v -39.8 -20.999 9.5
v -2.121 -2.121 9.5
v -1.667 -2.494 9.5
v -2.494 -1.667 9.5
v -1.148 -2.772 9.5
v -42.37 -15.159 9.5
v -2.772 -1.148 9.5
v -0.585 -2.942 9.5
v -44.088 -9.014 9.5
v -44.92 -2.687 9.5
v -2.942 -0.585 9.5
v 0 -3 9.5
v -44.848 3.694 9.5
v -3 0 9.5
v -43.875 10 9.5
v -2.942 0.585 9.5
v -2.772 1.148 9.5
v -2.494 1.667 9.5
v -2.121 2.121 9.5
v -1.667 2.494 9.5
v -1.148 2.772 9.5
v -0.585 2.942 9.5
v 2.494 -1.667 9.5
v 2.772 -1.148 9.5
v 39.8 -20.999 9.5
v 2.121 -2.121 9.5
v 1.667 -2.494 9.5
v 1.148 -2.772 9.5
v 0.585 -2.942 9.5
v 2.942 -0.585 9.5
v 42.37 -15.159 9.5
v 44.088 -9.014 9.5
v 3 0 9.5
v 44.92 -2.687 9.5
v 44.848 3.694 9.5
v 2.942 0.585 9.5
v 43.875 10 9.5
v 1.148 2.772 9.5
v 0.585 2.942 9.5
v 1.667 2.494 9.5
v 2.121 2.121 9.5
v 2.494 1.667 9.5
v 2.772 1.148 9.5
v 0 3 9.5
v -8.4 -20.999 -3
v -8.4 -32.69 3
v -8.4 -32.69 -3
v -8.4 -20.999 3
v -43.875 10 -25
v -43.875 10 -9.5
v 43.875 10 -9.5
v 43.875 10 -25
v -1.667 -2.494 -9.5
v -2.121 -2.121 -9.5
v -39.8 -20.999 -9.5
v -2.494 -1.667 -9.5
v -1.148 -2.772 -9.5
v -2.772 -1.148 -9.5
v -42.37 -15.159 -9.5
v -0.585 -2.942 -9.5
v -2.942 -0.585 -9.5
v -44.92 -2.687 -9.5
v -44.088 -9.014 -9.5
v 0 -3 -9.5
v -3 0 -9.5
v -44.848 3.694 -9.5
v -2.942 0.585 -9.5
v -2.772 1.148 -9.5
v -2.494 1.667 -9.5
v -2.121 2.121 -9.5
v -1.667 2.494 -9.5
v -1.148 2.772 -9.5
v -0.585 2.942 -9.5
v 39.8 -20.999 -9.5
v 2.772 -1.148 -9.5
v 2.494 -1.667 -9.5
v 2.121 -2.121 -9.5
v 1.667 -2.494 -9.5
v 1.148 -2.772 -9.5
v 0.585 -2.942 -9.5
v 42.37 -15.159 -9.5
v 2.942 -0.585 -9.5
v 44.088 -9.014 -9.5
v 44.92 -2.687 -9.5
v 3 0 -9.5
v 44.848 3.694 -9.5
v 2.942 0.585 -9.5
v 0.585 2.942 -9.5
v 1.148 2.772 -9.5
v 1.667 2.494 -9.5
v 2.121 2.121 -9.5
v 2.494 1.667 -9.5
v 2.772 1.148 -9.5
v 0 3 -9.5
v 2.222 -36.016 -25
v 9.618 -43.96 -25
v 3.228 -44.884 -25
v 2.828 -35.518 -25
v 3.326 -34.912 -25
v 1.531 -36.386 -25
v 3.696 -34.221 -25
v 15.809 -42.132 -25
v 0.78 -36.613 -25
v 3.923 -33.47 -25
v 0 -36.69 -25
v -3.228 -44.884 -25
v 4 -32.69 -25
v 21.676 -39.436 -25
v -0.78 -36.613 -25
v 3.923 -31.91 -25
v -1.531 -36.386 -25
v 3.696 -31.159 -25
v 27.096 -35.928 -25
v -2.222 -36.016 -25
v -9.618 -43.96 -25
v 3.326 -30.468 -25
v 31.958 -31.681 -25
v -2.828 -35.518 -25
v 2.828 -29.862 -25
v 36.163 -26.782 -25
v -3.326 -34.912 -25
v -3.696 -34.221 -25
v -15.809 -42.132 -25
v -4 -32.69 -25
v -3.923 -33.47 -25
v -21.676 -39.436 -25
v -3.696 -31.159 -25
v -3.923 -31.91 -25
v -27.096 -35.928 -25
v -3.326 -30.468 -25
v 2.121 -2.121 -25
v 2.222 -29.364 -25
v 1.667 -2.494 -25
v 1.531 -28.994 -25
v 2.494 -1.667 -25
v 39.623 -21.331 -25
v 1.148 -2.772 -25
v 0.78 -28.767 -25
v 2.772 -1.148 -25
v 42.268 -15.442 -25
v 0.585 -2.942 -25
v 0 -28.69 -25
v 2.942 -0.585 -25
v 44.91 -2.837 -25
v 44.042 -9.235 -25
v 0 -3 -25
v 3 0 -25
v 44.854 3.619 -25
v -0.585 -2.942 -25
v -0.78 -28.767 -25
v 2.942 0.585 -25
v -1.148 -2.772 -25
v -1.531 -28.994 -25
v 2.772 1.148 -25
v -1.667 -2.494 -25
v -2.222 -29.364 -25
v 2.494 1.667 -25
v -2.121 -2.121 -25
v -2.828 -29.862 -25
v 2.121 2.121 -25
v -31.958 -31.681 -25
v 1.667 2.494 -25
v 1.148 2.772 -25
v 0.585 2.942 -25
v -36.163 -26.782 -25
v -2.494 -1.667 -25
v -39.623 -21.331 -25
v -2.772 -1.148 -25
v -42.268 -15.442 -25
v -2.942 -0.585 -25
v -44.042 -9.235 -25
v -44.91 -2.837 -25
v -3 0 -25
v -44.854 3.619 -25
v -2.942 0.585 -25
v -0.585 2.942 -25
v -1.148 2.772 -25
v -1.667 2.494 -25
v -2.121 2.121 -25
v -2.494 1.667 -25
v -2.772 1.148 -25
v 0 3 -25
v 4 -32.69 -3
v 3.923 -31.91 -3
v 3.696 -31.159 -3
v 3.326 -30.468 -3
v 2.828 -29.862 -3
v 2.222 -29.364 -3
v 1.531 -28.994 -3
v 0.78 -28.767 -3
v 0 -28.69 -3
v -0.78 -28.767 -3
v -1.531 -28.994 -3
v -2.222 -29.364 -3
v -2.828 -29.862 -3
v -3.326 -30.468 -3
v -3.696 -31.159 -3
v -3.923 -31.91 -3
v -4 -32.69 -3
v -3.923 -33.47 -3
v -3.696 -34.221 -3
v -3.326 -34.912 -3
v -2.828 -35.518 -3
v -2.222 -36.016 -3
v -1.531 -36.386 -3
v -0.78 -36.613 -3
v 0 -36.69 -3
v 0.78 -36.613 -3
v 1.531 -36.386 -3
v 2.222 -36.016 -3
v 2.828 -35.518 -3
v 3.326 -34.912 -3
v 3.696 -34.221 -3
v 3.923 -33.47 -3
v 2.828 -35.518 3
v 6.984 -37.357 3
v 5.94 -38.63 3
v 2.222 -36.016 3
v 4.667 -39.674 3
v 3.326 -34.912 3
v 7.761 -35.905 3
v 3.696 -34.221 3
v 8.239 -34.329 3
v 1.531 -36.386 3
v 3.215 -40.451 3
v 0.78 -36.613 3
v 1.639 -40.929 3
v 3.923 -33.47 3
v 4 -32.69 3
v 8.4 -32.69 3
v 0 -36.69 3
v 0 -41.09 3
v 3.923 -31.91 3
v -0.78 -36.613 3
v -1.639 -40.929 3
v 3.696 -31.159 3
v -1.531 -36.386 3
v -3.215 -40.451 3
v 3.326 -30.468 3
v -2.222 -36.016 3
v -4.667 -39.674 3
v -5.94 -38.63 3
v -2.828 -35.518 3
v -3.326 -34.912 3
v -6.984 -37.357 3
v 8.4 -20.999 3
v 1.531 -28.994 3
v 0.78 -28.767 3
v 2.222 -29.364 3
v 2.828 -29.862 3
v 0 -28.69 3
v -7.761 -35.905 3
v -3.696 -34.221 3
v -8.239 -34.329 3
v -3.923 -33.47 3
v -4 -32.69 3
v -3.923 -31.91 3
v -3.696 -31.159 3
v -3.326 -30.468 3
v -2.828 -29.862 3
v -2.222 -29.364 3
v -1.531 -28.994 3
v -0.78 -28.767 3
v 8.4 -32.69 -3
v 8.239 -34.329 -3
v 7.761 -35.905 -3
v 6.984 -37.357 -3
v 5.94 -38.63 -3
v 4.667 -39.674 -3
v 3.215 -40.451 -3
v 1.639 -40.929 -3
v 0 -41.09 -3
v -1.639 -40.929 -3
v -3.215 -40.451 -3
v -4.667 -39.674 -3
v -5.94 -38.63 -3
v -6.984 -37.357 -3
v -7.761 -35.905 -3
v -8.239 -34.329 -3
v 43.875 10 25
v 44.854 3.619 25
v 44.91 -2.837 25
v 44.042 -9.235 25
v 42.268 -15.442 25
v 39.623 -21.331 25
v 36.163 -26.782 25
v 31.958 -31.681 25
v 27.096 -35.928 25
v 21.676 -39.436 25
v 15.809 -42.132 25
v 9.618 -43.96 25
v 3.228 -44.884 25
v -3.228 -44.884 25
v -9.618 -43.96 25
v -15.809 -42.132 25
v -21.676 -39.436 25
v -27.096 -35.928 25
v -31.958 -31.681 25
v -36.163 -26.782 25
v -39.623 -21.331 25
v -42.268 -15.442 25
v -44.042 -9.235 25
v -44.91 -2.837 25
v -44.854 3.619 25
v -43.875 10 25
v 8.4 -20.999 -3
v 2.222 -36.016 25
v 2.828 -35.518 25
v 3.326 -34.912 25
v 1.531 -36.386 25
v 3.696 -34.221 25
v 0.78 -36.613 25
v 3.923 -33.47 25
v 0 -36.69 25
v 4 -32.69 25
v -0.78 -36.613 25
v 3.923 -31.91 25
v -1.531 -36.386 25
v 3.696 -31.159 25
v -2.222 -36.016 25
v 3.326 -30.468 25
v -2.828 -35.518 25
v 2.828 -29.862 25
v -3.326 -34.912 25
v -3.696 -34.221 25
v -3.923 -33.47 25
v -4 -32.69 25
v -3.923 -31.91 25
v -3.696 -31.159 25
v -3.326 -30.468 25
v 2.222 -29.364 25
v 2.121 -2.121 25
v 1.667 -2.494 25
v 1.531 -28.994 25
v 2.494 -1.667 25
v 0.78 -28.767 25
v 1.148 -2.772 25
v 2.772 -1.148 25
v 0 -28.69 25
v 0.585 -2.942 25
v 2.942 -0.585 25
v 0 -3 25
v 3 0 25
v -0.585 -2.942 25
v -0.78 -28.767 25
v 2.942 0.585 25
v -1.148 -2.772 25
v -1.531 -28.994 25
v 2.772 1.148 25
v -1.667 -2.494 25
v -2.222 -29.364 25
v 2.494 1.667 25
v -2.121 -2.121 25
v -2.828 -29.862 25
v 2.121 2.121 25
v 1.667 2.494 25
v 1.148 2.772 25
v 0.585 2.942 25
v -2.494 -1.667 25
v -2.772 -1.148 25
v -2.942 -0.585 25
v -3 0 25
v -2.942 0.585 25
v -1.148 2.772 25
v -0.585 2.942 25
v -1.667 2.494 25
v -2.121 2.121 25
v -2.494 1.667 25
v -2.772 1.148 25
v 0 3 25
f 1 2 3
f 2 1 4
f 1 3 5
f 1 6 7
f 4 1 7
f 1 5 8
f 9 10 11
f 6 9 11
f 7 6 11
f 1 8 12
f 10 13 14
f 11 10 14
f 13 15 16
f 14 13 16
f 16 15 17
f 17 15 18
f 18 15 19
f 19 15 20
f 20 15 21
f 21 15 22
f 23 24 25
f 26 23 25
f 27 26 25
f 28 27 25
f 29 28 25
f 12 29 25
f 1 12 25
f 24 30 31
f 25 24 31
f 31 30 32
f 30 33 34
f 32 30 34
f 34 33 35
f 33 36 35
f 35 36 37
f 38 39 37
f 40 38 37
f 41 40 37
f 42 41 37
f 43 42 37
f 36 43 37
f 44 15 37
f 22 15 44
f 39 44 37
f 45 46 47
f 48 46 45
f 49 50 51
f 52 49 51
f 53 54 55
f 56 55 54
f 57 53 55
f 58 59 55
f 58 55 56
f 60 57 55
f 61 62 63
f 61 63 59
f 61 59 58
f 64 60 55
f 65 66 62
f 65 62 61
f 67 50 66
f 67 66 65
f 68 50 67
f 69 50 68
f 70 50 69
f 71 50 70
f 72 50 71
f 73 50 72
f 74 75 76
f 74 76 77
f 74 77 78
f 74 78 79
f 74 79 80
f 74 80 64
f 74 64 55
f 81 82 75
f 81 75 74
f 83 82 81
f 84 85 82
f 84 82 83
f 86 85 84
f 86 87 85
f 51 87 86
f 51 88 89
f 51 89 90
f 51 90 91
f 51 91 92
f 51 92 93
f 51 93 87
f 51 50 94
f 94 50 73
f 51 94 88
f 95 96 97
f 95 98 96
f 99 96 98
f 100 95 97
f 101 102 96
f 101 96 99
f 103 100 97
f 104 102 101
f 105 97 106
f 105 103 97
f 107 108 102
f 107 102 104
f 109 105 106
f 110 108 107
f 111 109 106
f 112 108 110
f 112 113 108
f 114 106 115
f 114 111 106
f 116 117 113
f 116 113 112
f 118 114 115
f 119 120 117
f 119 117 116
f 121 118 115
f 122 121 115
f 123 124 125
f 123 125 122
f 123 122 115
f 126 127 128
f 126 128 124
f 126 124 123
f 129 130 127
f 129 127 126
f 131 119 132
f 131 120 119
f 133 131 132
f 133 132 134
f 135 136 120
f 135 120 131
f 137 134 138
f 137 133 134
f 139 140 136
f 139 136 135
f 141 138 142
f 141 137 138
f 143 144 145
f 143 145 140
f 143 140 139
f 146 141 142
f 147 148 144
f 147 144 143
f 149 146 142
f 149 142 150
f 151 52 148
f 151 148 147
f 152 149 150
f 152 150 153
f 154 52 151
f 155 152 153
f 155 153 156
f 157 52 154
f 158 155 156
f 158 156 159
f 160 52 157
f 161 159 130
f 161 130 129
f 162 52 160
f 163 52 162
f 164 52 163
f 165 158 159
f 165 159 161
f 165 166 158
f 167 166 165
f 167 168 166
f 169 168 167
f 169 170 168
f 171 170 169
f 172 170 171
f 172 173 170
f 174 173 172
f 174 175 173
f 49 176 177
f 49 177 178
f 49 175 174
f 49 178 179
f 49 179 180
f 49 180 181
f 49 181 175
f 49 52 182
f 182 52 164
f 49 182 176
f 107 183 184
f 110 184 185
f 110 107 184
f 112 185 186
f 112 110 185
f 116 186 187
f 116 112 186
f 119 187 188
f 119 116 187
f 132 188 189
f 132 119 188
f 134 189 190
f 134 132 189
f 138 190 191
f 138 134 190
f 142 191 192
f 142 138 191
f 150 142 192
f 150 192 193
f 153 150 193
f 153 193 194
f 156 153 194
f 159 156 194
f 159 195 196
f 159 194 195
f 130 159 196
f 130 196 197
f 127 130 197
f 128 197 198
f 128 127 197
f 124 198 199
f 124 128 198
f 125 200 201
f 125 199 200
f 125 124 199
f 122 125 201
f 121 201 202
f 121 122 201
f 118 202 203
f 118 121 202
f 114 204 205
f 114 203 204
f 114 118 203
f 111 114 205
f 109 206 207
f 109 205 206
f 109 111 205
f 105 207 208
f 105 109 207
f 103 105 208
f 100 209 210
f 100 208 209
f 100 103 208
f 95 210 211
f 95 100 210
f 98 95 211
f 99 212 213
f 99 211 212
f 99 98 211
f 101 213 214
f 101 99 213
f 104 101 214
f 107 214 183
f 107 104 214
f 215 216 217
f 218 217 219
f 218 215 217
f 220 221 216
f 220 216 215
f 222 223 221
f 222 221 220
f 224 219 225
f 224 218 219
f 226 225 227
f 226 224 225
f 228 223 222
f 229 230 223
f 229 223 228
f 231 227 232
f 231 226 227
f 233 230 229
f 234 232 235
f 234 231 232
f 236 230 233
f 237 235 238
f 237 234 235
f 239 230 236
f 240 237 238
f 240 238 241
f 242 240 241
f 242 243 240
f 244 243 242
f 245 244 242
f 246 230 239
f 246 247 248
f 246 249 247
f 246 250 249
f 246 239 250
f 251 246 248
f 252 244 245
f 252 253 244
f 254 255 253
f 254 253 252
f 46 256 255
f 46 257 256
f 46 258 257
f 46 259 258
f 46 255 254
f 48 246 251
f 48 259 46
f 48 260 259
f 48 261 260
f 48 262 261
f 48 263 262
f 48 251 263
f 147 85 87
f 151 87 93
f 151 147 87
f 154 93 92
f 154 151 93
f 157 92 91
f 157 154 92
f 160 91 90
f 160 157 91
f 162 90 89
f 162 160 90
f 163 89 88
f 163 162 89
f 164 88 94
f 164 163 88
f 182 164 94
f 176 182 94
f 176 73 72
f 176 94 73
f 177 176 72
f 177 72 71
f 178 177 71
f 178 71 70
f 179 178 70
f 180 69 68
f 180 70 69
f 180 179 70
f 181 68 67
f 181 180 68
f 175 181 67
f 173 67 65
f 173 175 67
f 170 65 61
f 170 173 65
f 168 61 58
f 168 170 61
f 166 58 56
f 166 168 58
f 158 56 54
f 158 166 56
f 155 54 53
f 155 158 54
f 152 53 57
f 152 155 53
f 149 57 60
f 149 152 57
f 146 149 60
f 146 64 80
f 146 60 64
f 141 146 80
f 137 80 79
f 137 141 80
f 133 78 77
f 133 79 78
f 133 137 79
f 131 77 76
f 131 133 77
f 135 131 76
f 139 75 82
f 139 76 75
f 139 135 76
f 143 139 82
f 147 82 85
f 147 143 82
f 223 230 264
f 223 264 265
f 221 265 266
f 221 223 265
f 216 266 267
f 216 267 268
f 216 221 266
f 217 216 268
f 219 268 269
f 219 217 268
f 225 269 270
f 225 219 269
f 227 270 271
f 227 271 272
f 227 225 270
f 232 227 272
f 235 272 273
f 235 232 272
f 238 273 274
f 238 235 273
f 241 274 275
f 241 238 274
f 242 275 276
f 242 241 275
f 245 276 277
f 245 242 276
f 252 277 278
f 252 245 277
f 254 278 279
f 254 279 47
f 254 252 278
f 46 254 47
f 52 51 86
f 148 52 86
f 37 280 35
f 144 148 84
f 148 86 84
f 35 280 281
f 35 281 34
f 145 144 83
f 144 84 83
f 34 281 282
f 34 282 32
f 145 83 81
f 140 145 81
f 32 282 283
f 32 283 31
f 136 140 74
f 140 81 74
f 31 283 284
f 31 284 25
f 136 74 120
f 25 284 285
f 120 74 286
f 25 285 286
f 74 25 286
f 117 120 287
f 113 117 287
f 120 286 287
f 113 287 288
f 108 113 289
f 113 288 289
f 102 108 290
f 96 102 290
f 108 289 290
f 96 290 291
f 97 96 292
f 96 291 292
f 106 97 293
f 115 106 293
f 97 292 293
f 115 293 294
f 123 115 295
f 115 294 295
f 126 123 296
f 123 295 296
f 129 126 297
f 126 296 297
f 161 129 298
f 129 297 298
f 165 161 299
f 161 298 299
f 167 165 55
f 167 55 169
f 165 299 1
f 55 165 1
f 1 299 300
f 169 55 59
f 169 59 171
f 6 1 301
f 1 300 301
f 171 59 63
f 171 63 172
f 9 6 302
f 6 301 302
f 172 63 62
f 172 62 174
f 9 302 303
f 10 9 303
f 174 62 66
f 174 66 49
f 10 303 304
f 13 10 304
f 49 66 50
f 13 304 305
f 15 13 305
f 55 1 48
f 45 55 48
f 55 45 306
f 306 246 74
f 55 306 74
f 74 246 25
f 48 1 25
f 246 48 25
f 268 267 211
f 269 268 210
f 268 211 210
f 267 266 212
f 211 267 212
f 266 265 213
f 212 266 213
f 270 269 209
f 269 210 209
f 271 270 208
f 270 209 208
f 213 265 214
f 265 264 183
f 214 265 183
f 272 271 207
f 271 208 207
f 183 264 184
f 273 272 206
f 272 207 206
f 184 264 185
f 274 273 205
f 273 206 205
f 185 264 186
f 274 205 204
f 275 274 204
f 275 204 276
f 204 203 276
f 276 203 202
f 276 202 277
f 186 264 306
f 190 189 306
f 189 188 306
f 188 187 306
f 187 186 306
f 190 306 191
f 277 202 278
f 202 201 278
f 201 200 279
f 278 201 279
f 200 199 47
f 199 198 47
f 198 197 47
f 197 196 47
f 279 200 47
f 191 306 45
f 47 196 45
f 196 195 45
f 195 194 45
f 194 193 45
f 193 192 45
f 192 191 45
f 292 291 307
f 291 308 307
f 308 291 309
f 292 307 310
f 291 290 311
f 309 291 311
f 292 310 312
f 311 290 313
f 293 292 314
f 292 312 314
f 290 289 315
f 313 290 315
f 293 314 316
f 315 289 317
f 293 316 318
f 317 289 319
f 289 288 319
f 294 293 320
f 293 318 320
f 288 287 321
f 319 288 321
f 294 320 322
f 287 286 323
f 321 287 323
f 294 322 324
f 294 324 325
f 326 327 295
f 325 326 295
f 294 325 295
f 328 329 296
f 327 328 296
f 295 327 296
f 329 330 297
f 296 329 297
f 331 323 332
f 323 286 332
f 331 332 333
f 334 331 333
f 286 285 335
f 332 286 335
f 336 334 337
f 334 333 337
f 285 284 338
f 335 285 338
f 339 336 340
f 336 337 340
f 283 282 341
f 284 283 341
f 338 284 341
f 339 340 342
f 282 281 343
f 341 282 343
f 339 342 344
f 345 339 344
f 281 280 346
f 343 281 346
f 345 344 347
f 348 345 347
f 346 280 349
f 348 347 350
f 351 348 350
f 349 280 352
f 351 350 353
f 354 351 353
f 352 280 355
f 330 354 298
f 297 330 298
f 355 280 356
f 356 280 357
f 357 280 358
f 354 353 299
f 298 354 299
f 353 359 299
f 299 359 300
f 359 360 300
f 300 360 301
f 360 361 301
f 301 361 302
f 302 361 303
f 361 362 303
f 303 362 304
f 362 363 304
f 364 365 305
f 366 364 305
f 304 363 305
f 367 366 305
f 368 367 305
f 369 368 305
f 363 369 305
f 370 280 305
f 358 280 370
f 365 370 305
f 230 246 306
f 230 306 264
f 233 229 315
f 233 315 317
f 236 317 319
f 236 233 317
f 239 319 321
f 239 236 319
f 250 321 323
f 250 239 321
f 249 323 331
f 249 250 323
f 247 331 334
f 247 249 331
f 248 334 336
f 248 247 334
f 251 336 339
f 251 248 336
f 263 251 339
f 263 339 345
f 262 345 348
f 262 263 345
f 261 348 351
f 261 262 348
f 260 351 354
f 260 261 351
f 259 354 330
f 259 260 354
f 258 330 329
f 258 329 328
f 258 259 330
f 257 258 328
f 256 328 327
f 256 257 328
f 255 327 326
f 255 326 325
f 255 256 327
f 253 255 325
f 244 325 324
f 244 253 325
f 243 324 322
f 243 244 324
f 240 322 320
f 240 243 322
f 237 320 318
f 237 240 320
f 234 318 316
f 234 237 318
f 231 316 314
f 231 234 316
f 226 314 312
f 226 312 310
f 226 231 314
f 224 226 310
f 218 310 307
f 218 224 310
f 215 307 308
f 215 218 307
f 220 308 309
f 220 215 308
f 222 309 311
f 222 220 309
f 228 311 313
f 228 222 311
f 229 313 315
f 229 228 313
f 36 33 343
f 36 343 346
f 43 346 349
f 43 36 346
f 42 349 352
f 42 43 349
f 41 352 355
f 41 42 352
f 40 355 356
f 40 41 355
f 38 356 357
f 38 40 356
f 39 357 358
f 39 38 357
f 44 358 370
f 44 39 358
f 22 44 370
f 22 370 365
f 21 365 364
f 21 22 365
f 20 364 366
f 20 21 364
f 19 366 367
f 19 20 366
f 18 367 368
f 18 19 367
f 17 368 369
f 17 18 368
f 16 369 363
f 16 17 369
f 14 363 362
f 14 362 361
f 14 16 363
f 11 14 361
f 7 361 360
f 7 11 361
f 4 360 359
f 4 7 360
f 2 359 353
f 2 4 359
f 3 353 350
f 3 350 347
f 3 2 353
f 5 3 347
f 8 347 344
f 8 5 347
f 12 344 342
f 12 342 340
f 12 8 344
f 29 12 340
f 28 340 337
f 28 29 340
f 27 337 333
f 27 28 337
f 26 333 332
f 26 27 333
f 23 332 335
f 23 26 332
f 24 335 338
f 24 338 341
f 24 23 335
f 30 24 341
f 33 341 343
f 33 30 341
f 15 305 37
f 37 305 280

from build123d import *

# Parameters (mm, degrees)
SKETCH_1_R          = 4
SKETCH_1_R_2        = 3
EXTRUDE_1_DEPTH     = 25
SKETCH_2_W          = 106.280509252
SKETCH_2_H          = 41.998888678
CUT_EXTRUDE_1_DEPTH = 9.5
CUT_EXTRUDE_2_DEPTH = 3


with BuildPart() as part:
    # 草图1 → 凸台-拉伸1 (new, symmetric)
    with BuildSketch(Plane.XY):
        with BuildLine():
            Line((-43.874821937, 10), (43.874821937, 10))
            ThreePointArc((43.874821937, 10), (0, -45), (-43.874821937, 10))
        make_face()
        with Locations((0, -32.69)):
            Circle(SKETCH_1_R, mode=Mode.SUBTRACT)
        Circle(SKETCH_1_R_2, mode=Mode.SUBTRACT)
    extrude(amount=EXTRUDE_1_DEPTH, both=True)

    # 草图2 → 切除-拉伸1 (cut, symmetric)
    with BuildSketch(Plane.XY):
        Rectangle(SKETCH_2_W, SKETCH_2_H)
    extrude(amount=CUT_EXTRUDE_1_DEPTH, both=True, mode=Mode.SUBTRACT)

    # 草图3 → 切除-拉伸2 (cut, symmetric)
    with BuildSketch(Plane.XY):
        with BuildLine():
            Line((-8.4, -32.69), (-8.4, -18.964049075))
            Line((-8.4, -18.964049075), (8.4, -18.964049075))
            Line((8.4, -18.964049075), (8.4, -32.69))
            ThreePointArc((8.4, -32.69), (0, -41.09), (-8.4, -32.69))
        make_face()
    extrude(amount=CUT_EXTRUDE_2_DEPTH, both=True, mode=Mode.SUBTRACT)


solid = part.part
